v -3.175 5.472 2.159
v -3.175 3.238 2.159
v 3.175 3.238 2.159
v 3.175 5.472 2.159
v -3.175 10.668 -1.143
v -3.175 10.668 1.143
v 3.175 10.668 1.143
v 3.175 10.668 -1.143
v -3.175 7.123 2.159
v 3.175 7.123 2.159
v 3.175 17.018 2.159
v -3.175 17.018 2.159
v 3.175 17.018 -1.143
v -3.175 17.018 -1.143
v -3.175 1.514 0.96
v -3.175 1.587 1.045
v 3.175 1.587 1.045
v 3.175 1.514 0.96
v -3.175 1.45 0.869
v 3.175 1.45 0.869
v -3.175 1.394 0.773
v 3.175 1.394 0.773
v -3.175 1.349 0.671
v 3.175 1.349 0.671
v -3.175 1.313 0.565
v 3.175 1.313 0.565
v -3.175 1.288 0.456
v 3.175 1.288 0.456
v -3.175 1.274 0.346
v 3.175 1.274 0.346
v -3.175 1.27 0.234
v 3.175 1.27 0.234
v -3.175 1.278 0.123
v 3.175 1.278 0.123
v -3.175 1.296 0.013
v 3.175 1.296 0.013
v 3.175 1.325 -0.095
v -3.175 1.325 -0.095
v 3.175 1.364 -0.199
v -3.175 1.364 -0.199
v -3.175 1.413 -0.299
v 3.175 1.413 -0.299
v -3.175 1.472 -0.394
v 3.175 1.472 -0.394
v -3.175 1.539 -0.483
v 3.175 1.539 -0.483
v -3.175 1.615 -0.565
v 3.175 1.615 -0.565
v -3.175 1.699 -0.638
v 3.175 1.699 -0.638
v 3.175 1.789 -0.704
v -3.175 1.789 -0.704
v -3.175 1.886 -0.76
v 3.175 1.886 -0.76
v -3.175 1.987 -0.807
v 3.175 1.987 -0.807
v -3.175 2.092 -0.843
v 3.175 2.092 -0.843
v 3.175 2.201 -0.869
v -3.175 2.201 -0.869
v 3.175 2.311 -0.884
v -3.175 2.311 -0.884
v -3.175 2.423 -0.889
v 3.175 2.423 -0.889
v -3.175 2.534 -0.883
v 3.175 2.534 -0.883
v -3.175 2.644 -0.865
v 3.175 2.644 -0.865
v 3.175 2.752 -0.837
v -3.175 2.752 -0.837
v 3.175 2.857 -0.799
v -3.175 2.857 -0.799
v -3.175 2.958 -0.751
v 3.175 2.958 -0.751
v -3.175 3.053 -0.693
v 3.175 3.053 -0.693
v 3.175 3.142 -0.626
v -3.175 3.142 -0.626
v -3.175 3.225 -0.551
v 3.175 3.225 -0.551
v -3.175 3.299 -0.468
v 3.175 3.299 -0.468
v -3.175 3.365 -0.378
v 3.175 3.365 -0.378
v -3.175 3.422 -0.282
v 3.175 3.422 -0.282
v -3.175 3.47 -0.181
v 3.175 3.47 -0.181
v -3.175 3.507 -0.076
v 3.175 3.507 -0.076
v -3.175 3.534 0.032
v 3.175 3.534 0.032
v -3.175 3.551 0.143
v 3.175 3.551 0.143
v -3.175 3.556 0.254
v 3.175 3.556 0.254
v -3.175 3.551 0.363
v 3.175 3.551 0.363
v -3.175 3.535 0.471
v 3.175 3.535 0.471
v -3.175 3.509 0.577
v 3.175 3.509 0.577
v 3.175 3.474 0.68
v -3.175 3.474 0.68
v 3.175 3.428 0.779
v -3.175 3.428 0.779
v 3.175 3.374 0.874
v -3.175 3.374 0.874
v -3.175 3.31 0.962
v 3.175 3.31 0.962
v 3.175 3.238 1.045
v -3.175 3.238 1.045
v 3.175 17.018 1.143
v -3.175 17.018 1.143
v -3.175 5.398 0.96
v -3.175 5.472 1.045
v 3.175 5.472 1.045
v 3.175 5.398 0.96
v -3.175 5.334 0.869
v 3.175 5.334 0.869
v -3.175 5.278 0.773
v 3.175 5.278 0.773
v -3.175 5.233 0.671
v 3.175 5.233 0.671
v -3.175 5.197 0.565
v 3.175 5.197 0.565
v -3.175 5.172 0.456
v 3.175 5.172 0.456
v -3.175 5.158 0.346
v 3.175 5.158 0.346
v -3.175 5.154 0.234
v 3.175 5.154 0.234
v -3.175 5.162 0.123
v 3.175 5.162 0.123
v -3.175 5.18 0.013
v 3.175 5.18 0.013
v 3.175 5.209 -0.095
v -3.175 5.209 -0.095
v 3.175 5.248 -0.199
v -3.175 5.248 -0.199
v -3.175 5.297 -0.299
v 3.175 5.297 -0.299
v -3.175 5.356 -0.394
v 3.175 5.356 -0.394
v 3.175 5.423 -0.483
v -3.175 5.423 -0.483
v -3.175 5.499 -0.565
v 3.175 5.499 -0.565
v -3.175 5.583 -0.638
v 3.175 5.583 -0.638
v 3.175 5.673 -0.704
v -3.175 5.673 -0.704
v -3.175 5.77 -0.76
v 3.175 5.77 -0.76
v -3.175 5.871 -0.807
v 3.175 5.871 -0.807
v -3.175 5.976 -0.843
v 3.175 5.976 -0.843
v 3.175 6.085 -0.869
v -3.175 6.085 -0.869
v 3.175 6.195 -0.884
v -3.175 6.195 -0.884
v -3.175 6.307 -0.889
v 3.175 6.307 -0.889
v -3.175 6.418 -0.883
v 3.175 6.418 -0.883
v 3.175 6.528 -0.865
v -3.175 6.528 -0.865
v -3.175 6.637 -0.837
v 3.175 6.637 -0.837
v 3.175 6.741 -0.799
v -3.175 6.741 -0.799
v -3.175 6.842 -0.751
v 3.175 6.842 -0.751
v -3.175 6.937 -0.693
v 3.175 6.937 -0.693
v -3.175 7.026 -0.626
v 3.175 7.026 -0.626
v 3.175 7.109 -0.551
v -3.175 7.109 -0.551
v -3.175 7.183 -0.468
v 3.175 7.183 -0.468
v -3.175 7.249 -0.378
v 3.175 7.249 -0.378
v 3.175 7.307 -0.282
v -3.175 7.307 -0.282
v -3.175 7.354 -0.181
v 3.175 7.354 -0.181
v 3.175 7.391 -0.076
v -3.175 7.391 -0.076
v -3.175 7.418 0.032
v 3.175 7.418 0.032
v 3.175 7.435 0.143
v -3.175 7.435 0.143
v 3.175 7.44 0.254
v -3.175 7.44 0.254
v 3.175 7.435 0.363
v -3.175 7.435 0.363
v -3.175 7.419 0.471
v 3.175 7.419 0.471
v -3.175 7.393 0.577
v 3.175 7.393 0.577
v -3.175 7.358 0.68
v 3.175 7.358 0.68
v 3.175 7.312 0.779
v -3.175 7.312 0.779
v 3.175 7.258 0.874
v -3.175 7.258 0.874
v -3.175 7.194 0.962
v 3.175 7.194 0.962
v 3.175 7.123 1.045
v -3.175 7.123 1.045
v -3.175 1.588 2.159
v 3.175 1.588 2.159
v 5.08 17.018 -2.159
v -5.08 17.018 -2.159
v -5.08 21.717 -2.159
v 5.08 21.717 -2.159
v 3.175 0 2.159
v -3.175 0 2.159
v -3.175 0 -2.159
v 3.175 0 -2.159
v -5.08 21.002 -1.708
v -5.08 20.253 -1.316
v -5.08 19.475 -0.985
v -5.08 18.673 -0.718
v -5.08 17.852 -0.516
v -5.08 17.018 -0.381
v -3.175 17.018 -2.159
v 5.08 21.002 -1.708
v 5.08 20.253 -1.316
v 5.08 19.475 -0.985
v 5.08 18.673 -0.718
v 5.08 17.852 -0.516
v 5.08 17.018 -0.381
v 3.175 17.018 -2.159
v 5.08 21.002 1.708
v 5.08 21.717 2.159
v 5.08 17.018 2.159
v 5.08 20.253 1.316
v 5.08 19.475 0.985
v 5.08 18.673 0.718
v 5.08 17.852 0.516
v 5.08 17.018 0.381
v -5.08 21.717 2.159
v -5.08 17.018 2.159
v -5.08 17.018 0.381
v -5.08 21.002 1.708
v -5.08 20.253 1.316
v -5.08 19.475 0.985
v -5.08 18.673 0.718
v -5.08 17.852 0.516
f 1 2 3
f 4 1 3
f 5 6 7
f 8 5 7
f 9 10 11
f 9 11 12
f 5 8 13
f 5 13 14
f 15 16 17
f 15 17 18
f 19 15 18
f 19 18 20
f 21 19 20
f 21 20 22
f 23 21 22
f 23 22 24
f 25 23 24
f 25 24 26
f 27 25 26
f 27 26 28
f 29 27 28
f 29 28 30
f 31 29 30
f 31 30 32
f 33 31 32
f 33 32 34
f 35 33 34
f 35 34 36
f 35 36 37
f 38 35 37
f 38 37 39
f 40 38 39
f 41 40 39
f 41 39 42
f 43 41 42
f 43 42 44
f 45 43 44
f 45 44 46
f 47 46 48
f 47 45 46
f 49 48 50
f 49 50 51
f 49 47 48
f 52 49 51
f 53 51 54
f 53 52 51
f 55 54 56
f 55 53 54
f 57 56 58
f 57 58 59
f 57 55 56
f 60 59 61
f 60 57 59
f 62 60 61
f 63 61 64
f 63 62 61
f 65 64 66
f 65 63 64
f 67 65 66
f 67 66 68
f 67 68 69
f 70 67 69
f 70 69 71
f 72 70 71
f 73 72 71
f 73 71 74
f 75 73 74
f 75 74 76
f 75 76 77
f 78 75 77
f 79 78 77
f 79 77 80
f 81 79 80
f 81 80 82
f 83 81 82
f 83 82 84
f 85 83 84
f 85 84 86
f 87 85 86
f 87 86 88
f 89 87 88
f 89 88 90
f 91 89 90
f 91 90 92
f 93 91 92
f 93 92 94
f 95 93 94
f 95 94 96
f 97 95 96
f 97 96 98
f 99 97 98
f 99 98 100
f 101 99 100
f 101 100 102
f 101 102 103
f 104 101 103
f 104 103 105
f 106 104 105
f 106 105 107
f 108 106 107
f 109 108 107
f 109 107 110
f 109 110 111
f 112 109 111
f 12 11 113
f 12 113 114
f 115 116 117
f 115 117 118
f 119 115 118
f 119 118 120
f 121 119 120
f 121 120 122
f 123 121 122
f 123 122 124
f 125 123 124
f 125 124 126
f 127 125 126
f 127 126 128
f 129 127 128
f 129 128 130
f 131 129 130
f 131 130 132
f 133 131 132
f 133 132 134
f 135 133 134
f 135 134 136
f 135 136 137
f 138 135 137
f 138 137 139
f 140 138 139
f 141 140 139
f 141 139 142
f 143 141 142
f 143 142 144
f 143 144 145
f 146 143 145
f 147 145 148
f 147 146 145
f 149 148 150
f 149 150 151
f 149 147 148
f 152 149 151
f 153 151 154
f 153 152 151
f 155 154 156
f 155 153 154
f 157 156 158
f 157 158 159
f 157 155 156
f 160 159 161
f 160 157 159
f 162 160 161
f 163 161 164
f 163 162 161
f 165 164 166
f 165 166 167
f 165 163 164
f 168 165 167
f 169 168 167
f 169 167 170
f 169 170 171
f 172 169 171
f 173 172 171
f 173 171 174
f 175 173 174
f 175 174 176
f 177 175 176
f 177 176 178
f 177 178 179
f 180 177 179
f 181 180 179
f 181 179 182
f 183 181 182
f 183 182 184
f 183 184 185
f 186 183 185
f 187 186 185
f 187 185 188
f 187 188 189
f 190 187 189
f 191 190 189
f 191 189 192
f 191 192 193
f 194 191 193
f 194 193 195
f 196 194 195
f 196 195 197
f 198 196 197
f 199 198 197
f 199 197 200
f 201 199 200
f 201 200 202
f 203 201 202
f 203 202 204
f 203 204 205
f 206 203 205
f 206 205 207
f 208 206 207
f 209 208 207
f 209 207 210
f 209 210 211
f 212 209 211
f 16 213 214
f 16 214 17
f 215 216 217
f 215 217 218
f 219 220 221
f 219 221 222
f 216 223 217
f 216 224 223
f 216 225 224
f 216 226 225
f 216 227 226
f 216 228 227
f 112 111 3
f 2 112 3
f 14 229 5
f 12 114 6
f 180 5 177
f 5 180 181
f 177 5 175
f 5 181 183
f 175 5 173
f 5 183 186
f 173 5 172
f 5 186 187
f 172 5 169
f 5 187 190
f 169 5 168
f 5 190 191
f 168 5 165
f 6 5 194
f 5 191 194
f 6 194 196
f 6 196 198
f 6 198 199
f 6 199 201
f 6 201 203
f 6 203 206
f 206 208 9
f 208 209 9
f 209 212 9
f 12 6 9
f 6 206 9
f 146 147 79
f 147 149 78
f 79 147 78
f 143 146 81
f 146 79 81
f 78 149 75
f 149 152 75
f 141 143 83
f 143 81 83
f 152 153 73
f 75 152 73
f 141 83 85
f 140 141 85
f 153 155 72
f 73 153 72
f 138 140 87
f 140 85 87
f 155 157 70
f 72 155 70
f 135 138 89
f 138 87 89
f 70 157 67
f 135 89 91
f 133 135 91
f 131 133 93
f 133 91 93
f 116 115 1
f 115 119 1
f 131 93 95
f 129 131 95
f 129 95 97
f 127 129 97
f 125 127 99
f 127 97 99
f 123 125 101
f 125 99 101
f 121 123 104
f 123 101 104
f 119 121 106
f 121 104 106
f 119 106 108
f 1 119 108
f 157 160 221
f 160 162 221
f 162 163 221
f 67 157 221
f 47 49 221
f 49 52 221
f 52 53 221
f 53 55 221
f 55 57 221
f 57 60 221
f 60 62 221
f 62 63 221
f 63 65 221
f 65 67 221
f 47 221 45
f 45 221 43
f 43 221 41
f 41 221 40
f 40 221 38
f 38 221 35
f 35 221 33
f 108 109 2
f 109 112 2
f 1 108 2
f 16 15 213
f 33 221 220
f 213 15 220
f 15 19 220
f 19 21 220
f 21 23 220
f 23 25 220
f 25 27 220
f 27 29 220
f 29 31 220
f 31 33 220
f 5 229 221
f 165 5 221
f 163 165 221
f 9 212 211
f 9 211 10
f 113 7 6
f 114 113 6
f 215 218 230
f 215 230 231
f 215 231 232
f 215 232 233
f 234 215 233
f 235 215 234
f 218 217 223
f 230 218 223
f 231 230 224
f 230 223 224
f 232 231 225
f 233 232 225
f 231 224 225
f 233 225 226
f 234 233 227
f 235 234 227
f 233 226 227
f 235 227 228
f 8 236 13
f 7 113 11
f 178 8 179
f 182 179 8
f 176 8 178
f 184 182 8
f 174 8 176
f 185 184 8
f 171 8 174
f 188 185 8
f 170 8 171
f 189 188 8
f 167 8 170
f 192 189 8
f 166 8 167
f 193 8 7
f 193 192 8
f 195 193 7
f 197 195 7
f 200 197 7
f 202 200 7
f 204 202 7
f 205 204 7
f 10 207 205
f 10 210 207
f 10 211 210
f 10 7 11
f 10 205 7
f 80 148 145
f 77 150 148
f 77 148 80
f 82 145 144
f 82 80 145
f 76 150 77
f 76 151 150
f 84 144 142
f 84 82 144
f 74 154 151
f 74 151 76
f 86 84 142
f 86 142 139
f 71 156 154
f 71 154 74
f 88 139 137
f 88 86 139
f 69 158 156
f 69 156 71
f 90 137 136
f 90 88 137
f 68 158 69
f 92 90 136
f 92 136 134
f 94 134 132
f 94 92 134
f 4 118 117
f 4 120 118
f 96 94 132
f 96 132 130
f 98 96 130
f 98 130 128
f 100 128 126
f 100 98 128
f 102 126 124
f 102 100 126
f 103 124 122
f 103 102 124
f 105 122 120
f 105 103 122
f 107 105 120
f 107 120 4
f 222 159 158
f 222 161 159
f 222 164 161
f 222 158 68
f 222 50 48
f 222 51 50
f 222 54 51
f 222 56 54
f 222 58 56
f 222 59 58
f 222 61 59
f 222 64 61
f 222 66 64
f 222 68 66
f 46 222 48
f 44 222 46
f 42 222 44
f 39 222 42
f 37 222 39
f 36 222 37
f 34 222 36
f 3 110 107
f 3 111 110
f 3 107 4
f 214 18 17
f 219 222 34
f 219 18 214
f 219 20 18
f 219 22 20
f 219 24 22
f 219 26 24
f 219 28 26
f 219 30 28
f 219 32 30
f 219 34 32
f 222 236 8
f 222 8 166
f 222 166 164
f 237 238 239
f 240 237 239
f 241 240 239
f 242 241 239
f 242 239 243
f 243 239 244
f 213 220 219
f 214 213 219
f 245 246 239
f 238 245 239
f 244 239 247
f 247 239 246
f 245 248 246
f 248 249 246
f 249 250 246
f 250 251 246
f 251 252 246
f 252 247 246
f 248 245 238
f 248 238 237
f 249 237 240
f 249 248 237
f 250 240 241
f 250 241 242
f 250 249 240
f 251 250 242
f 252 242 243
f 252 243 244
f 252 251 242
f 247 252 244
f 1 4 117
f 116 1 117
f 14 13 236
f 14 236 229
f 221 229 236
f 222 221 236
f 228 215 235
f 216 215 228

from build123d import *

# Parameters (mm, degrees)
F0_W     = 6.35
F0_H     = 4.318
F1_DEPTH = 10.668
F3_DEPTH = 3.175
F4_W     = 6.35
F4_H     = 1.016
F5_DEPTH = 6.35
F6_W     = 3.175
F6_H     = 1.016
F7_DEPTH = 4.699
F9_DEPTH = 10.16


with BuildPart() as f1:
    # F0 (on Front) → F1 (new body)
    with BuildSketch(Plane.XZ):
        Rectangle(F0_W, F0_H)
    extrude(amount=-F1_DEPTH)

    # F2 (on Right) → F3 (cut, symmetric)
    with BuildSketch(Plane.YZ):
        with BuildLine():
            ThreePointArc((1.5875, 1.0445686245), (1.9870290503, -0.8066591111), (3.556, 0.254))
            ThreePointArc((3.556, 0.254), (3.4736591111, 0.6799709497), (3.2385, 1.0445686245))
            Line((3.2385, 1.0445686245), (3.2385, 0.7229302428))
            Line((3.2385, 0.7229302428), (2.413, 0.7229302428))
            Line((2.413, 0.7229302428), (1.5875, 0.7229302428))
            Line((1.5875, 0.7229302428), (1.5875, 1.0445686245))
        make_face()
        with BuildLine():
            Line((3.2385, 0.7229302428), (3.2385, 1.0445686245))
            ThreePointArc((3.2385, 1.0445686245), (2.8617923029, 1.3052061971), (2.413, 1.397))
            Line((2.413, 1.397), (2.413, 0.7229302428))
            Line((2.413, 0.7229302428), (3.2385, 0.7229302428))
        make_face()
        with BuildLine():
            ThreePointArc((2.413, 1.397), (2.8617923029, 1.3052061971), (3.2385, 1.0445686245))
            Line((3.2385, 1.0445686245), (3.2385, 2.2007736843))
            Line((3.2385, 2.2007736843), (2.413, 2.2007736843))
            Line((2.413, 2.2007736843), (2.413, 1.397))
        make_face()
        with BuildLine():
            Line((1.5875, 2.2007736843), (1.5875, 1.0445686245))
            ThreePointArc((1.5875, 1.0445686245), (1.9642076971, 1.3052061971), (2.413, 1.397))
            Line((2.413, 1.397), (2.413, 2.2007736843))
            Line((2.413, 2.2007736843), (1.5875, 2.2007736843))
        make_face()
        with BuildLine():
            ThreePointArc((2.413, 1.397), (1.9642076971, 1.3052061971), (1.5875, 1.0445686245))
            Line((1.5875, 1.0445686245), (1.5875, 0.7229302428))
            Line((1.5875, 0.7229302428), (2.413, 0.7229302428))
            Line((2.413, 0.7229302428), (2.413, 1.397))
        make_face()
        with BuildLine():
            ThreePointArc((5.4715363942, 1.0445686245), (5.8710654445, -0.8066591111), (7.4400363942, 0.254))
            ThreePointArc((7.4400363942, 0.254), (7.3576955054, 0.6799709497), (7.1225363942, 1.0445686245))
            Line((7.1225363942, 1.0445686245), (7.1225363942, 0.7229302428))
            Line((7.1225363942, 0.7229302428), (6.2970363942, 0.7229302428))
            Line((6.2970363942, 0.7229302428), (5.4715363942, 0.7229302428))
            Line((5.4715363942, 0.7229302428), (5.4715363942, 1.0445686245))
        make_face()
        with BuildLine():
            Line((7.1225363942, 0.7229302428), (7.1225363942, 1.0445686245))
            ThreePointArc((7.1225363942, 1.0445686245), (6.7458286971, 1.3052061971), (6.2970363942, 1.397))
            Line((6.2970363942, 1.397), (6.2970363942, 0.7229302428))
            Line((6.2970363942, 0.7229302428), (7.1225363942, 0.7229302428))
        make_face()
        with BuildLine():
            ThreePointArc((6.2970363942, 1.397), (6.7458286971, 1.3052061971), (7.1225363942, 1.0445686245))
            Line((7.1225363942, 1.0445686245), (7.1225363942, 2.2007736843))
            Line((7.1225363942, 2.2007736843), (6.2970363942, 2.2007736843))
            Line((6.2970363942, 2.2007736843), (6.2970363942, 1.397))
        make_face()
        with BuildLine():
            Line((5.4715363942, 2.2007736843), (5.4715363942, 1.0445686245))
            ThreePointArc((5.4715363942, 1.0445686245), (5.8482440914, 1.3052061971), (6.2970363942, 1.397))
            Line((6.2970363942, 1.397), (6.2970363942, 2.2007736843))
            Line((6.2970363942, 2.2007736843), (5.4715363942, 2.2007736843))
        make_face()
        with BuildLine():
            ThreePointArc((6.2970363942, 1.397), (5.8482440914, 1.3052061971), (5.4715363942, 1.0445686245))
            Line((5.4715363942, 1.0445686245), (5.4715363942, 0.7229302428))
            Line((5.4715363942, 0.7229302428), (6.2970363942, 0.7229302428))
            Line((6.2970363942, 0.7229302428), (6.2970363942, 1.397))
        make_face()
    extrude(amount=F3_DEPTH, both=True, mode=Mode.SUBTRACT)

    # F4 (on face) → F5 (join)
    with BuildSketch(Plane(origin=(0, 10.668, 0), x_dir=(-1, 0, 0), z_dir=(0, 1, 0))):
        with Locations((0, 1.651)):
            Rectangle(F4_W, F4_H)
        with Locations((0, -1.651)):
            Rectangle(F4_W, F4_H)
    extrude(amount=F5_DEPTH)


with BuildPart() as f7:
    # F6 (on face) → F7 (new body)
    with BuildSketch(Plane(origin=(0, 17.018, 0), x_dir=(-1, 0, 0), z_dir=(0, 1, 0))):
        Polygon((-3.175, 1.143), (-3.175, 2.159), (-5.08, 2.159), (-5.08, 0.381), (0, 0.381), (0, 1.143), align=None)
        with Locations((-1.5875, 1.651)):
            Rectangle(F6_W, F6_H)
        with Locations((1.5875, 1.651)):
            Rectangle(F6_W, F6_H)
        Polygon((3.175, 1.143), (0, 1.143), (0, 0.381), (5.08, 0.381), (5.08, 2.159), (3.175, 2.159), align=None)
    extrude(amount=F7_DEPTH)

    # F8 (on face) → F9 (intersect, through all)
    with BuildSketch(Plane(origin=(-5.08, 0, 0), x_dir=(0, -1, 0), z_dir=(-1, 0, 0))):
        with BuildLine():
            Line((-17.018, 2.159), (-21.717, 2.159))
            ThreePointArc((-21.717, 2.159), (-19.4752190576, 0.9853139193), (-17.018, 0.381))
            Line((-17.018, 0.381), (-17.018, 2.159))
        make_face()
    extrude(amount=-F9_DEPTH, mode=Mode.INTERSECT)


with BuildPart() as f10_1:
    # F10: instance of F7
    add(f7.part.mirror(Plane.XY))


solid = Compound([f1.part, f7.part, f10_1.part])
